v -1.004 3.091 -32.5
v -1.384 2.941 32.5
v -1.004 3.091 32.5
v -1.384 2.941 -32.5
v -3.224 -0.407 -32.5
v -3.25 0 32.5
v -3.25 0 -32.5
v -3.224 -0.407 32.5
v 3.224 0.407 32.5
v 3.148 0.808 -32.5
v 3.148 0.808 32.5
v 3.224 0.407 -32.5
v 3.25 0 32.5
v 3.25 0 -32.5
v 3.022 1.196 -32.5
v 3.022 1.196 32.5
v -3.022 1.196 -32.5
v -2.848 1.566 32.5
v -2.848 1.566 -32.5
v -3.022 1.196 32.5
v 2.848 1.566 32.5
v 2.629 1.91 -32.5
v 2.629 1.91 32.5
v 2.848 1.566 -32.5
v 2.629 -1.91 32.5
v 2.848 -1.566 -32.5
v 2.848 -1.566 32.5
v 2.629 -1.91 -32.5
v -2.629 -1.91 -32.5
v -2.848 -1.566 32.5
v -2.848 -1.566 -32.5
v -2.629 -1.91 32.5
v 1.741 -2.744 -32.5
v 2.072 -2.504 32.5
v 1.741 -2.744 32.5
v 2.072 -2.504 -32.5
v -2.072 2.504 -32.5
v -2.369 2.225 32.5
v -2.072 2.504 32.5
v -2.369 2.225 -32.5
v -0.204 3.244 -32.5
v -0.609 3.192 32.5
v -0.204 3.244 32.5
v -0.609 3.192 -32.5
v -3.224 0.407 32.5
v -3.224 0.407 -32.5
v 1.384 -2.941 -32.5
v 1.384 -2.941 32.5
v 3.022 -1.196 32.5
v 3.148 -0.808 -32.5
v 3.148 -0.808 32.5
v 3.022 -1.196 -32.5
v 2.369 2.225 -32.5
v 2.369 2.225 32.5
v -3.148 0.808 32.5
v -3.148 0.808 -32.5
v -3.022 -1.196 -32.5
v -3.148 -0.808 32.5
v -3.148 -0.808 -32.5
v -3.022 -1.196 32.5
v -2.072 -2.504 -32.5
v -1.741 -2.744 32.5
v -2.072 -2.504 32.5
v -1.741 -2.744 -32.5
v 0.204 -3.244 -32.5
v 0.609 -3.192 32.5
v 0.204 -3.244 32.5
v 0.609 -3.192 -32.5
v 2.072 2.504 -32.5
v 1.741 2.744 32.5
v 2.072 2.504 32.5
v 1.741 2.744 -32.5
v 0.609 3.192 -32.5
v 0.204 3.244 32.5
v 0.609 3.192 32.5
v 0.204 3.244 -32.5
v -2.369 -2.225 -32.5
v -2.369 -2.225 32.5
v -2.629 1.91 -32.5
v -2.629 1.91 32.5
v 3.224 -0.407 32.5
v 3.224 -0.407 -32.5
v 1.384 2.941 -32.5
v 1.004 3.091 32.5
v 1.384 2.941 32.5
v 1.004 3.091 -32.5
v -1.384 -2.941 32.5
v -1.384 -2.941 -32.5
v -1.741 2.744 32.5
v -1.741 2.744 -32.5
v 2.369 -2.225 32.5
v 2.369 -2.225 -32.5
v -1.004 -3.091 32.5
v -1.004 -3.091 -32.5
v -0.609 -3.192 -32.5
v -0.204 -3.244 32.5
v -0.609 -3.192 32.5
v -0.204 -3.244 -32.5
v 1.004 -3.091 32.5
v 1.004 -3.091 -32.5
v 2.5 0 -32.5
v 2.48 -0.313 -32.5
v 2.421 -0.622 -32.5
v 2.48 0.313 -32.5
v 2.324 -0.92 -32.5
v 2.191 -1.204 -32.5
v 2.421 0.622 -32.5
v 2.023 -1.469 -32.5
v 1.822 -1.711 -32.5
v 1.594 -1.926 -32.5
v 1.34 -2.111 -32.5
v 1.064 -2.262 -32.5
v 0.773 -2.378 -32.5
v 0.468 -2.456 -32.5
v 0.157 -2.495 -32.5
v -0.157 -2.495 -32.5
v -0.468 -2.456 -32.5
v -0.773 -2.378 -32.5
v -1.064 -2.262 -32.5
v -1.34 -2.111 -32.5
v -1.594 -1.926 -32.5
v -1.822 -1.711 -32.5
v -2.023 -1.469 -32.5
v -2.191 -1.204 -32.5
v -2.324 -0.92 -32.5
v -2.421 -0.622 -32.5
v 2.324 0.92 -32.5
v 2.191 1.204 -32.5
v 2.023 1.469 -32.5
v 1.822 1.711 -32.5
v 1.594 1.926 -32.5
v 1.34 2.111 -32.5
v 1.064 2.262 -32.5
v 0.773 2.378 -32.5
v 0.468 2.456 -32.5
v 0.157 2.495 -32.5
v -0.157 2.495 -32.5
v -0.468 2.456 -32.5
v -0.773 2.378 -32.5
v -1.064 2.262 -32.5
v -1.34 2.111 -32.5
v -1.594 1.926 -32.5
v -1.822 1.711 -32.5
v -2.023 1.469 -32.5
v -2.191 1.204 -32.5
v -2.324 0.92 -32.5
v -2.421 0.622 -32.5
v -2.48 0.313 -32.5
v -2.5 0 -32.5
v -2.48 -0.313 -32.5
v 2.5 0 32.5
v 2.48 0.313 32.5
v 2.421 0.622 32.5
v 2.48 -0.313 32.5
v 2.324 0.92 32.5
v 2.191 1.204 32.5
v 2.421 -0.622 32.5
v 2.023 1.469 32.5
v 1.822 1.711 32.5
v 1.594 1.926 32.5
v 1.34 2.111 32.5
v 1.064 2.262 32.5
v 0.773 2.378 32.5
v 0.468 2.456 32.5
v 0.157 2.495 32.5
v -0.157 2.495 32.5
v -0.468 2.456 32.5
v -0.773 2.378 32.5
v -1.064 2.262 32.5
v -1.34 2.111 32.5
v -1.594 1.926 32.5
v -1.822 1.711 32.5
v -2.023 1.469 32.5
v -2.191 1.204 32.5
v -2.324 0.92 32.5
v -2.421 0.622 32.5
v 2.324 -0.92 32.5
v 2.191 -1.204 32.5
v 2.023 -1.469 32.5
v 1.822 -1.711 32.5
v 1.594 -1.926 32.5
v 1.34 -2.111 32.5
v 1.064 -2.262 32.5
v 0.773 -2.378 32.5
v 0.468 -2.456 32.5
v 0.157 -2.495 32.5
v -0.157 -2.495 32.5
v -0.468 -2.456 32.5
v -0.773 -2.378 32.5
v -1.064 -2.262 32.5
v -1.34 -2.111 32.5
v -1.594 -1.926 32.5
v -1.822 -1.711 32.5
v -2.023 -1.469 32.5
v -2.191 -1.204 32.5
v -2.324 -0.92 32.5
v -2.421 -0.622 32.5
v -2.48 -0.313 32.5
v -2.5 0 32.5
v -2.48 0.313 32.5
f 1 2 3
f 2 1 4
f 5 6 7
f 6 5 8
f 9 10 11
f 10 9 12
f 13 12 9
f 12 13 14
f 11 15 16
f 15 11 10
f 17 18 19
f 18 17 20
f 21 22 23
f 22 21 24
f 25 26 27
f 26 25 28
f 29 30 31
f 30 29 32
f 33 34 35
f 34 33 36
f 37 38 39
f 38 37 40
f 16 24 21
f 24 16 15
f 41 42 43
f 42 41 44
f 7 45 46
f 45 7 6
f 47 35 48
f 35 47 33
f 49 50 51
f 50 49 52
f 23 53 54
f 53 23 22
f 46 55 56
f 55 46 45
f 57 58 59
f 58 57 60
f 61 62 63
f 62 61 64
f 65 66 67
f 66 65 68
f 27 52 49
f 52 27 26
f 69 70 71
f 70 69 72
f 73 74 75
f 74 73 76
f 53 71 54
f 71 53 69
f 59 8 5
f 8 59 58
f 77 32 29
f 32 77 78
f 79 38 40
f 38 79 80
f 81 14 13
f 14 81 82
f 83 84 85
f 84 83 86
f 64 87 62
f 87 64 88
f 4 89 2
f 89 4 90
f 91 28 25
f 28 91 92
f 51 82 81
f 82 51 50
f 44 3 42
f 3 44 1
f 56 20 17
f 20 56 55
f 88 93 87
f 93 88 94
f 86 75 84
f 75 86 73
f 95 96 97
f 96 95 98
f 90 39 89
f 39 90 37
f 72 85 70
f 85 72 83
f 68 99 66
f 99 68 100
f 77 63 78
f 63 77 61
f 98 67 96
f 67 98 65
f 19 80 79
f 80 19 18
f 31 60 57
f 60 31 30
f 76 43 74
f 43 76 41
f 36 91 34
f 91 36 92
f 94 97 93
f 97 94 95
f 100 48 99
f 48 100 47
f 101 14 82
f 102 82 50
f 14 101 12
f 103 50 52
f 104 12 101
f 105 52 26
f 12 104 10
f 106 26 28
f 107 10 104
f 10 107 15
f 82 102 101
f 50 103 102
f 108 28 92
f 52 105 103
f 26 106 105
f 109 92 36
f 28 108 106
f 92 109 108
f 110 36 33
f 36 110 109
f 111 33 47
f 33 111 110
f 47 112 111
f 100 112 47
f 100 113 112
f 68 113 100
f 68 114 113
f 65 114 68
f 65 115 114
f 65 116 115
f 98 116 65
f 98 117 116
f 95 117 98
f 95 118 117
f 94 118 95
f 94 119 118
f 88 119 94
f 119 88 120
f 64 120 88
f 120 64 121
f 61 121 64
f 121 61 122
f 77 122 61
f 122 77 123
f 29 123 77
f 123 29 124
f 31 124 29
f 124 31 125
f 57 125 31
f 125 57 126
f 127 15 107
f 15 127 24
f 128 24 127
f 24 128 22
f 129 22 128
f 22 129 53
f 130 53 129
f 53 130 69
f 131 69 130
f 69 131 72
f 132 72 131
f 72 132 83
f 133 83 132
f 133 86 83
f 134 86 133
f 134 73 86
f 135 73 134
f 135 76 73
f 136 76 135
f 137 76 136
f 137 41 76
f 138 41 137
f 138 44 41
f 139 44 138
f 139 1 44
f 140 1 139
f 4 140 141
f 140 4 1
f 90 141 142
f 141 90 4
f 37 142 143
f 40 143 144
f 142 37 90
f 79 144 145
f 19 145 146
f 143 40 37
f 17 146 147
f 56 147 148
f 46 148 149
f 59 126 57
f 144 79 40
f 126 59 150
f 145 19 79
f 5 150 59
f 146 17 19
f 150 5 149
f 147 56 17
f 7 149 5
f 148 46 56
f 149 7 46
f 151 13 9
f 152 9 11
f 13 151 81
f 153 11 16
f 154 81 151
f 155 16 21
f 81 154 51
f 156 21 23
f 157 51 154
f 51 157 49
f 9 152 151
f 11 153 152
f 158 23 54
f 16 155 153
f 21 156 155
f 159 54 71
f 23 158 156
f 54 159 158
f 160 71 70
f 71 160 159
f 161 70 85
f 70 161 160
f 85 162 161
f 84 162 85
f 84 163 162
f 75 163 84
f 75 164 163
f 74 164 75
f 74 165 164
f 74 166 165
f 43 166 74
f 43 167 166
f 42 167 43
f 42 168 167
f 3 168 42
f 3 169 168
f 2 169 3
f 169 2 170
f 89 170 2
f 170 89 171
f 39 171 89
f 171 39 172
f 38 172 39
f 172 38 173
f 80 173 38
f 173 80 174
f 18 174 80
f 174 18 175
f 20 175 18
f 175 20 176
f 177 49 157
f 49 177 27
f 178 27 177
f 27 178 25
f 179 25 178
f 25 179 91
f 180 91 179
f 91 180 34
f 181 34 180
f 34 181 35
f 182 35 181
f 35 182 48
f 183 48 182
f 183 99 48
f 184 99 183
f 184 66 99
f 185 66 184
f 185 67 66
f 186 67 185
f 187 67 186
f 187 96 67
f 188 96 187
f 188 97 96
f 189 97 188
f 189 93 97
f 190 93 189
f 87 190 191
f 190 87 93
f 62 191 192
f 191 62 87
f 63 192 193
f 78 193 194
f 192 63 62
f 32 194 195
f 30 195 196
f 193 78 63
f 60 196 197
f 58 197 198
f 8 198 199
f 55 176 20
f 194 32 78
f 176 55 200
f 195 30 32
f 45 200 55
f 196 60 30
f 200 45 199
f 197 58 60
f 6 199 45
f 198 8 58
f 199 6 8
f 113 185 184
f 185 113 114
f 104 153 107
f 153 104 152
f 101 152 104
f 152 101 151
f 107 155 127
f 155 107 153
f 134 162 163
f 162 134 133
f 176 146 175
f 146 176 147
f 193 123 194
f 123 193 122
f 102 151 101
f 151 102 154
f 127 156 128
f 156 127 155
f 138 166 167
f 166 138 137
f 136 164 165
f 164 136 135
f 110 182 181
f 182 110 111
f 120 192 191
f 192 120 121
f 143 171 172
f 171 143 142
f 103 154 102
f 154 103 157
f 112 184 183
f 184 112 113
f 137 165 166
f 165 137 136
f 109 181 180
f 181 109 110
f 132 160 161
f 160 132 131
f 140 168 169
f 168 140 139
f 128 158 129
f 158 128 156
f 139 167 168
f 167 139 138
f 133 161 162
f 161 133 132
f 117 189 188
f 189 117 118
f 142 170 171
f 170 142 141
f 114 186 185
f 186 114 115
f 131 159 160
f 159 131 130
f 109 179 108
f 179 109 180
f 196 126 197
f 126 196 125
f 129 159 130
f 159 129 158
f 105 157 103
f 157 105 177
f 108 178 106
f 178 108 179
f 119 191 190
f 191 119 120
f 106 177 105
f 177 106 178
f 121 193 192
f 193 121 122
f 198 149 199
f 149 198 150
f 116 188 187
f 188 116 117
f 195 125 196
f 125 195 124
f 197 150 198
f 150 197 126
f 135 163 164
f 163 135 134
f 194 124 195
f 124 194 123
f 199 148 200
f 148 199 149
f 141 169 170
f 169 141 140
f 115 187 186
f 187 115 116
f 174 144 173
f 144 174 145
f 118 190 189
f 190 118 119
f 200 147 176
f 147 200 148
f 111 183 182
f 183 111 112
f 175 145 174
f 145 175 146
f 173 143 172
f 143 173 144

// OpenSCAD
$fn = 50;


difference() {
	union() {
		translate(v = [0, 0, -32.5000000000]) {
			cylinder(h = 65, r = 3.2500000000);
		}
	}
	union() {
		translate(v = [0, 0, -100.0000000000]) {
			cylinder(h = 200, r = 2.5000000000);
		}
	}
}
